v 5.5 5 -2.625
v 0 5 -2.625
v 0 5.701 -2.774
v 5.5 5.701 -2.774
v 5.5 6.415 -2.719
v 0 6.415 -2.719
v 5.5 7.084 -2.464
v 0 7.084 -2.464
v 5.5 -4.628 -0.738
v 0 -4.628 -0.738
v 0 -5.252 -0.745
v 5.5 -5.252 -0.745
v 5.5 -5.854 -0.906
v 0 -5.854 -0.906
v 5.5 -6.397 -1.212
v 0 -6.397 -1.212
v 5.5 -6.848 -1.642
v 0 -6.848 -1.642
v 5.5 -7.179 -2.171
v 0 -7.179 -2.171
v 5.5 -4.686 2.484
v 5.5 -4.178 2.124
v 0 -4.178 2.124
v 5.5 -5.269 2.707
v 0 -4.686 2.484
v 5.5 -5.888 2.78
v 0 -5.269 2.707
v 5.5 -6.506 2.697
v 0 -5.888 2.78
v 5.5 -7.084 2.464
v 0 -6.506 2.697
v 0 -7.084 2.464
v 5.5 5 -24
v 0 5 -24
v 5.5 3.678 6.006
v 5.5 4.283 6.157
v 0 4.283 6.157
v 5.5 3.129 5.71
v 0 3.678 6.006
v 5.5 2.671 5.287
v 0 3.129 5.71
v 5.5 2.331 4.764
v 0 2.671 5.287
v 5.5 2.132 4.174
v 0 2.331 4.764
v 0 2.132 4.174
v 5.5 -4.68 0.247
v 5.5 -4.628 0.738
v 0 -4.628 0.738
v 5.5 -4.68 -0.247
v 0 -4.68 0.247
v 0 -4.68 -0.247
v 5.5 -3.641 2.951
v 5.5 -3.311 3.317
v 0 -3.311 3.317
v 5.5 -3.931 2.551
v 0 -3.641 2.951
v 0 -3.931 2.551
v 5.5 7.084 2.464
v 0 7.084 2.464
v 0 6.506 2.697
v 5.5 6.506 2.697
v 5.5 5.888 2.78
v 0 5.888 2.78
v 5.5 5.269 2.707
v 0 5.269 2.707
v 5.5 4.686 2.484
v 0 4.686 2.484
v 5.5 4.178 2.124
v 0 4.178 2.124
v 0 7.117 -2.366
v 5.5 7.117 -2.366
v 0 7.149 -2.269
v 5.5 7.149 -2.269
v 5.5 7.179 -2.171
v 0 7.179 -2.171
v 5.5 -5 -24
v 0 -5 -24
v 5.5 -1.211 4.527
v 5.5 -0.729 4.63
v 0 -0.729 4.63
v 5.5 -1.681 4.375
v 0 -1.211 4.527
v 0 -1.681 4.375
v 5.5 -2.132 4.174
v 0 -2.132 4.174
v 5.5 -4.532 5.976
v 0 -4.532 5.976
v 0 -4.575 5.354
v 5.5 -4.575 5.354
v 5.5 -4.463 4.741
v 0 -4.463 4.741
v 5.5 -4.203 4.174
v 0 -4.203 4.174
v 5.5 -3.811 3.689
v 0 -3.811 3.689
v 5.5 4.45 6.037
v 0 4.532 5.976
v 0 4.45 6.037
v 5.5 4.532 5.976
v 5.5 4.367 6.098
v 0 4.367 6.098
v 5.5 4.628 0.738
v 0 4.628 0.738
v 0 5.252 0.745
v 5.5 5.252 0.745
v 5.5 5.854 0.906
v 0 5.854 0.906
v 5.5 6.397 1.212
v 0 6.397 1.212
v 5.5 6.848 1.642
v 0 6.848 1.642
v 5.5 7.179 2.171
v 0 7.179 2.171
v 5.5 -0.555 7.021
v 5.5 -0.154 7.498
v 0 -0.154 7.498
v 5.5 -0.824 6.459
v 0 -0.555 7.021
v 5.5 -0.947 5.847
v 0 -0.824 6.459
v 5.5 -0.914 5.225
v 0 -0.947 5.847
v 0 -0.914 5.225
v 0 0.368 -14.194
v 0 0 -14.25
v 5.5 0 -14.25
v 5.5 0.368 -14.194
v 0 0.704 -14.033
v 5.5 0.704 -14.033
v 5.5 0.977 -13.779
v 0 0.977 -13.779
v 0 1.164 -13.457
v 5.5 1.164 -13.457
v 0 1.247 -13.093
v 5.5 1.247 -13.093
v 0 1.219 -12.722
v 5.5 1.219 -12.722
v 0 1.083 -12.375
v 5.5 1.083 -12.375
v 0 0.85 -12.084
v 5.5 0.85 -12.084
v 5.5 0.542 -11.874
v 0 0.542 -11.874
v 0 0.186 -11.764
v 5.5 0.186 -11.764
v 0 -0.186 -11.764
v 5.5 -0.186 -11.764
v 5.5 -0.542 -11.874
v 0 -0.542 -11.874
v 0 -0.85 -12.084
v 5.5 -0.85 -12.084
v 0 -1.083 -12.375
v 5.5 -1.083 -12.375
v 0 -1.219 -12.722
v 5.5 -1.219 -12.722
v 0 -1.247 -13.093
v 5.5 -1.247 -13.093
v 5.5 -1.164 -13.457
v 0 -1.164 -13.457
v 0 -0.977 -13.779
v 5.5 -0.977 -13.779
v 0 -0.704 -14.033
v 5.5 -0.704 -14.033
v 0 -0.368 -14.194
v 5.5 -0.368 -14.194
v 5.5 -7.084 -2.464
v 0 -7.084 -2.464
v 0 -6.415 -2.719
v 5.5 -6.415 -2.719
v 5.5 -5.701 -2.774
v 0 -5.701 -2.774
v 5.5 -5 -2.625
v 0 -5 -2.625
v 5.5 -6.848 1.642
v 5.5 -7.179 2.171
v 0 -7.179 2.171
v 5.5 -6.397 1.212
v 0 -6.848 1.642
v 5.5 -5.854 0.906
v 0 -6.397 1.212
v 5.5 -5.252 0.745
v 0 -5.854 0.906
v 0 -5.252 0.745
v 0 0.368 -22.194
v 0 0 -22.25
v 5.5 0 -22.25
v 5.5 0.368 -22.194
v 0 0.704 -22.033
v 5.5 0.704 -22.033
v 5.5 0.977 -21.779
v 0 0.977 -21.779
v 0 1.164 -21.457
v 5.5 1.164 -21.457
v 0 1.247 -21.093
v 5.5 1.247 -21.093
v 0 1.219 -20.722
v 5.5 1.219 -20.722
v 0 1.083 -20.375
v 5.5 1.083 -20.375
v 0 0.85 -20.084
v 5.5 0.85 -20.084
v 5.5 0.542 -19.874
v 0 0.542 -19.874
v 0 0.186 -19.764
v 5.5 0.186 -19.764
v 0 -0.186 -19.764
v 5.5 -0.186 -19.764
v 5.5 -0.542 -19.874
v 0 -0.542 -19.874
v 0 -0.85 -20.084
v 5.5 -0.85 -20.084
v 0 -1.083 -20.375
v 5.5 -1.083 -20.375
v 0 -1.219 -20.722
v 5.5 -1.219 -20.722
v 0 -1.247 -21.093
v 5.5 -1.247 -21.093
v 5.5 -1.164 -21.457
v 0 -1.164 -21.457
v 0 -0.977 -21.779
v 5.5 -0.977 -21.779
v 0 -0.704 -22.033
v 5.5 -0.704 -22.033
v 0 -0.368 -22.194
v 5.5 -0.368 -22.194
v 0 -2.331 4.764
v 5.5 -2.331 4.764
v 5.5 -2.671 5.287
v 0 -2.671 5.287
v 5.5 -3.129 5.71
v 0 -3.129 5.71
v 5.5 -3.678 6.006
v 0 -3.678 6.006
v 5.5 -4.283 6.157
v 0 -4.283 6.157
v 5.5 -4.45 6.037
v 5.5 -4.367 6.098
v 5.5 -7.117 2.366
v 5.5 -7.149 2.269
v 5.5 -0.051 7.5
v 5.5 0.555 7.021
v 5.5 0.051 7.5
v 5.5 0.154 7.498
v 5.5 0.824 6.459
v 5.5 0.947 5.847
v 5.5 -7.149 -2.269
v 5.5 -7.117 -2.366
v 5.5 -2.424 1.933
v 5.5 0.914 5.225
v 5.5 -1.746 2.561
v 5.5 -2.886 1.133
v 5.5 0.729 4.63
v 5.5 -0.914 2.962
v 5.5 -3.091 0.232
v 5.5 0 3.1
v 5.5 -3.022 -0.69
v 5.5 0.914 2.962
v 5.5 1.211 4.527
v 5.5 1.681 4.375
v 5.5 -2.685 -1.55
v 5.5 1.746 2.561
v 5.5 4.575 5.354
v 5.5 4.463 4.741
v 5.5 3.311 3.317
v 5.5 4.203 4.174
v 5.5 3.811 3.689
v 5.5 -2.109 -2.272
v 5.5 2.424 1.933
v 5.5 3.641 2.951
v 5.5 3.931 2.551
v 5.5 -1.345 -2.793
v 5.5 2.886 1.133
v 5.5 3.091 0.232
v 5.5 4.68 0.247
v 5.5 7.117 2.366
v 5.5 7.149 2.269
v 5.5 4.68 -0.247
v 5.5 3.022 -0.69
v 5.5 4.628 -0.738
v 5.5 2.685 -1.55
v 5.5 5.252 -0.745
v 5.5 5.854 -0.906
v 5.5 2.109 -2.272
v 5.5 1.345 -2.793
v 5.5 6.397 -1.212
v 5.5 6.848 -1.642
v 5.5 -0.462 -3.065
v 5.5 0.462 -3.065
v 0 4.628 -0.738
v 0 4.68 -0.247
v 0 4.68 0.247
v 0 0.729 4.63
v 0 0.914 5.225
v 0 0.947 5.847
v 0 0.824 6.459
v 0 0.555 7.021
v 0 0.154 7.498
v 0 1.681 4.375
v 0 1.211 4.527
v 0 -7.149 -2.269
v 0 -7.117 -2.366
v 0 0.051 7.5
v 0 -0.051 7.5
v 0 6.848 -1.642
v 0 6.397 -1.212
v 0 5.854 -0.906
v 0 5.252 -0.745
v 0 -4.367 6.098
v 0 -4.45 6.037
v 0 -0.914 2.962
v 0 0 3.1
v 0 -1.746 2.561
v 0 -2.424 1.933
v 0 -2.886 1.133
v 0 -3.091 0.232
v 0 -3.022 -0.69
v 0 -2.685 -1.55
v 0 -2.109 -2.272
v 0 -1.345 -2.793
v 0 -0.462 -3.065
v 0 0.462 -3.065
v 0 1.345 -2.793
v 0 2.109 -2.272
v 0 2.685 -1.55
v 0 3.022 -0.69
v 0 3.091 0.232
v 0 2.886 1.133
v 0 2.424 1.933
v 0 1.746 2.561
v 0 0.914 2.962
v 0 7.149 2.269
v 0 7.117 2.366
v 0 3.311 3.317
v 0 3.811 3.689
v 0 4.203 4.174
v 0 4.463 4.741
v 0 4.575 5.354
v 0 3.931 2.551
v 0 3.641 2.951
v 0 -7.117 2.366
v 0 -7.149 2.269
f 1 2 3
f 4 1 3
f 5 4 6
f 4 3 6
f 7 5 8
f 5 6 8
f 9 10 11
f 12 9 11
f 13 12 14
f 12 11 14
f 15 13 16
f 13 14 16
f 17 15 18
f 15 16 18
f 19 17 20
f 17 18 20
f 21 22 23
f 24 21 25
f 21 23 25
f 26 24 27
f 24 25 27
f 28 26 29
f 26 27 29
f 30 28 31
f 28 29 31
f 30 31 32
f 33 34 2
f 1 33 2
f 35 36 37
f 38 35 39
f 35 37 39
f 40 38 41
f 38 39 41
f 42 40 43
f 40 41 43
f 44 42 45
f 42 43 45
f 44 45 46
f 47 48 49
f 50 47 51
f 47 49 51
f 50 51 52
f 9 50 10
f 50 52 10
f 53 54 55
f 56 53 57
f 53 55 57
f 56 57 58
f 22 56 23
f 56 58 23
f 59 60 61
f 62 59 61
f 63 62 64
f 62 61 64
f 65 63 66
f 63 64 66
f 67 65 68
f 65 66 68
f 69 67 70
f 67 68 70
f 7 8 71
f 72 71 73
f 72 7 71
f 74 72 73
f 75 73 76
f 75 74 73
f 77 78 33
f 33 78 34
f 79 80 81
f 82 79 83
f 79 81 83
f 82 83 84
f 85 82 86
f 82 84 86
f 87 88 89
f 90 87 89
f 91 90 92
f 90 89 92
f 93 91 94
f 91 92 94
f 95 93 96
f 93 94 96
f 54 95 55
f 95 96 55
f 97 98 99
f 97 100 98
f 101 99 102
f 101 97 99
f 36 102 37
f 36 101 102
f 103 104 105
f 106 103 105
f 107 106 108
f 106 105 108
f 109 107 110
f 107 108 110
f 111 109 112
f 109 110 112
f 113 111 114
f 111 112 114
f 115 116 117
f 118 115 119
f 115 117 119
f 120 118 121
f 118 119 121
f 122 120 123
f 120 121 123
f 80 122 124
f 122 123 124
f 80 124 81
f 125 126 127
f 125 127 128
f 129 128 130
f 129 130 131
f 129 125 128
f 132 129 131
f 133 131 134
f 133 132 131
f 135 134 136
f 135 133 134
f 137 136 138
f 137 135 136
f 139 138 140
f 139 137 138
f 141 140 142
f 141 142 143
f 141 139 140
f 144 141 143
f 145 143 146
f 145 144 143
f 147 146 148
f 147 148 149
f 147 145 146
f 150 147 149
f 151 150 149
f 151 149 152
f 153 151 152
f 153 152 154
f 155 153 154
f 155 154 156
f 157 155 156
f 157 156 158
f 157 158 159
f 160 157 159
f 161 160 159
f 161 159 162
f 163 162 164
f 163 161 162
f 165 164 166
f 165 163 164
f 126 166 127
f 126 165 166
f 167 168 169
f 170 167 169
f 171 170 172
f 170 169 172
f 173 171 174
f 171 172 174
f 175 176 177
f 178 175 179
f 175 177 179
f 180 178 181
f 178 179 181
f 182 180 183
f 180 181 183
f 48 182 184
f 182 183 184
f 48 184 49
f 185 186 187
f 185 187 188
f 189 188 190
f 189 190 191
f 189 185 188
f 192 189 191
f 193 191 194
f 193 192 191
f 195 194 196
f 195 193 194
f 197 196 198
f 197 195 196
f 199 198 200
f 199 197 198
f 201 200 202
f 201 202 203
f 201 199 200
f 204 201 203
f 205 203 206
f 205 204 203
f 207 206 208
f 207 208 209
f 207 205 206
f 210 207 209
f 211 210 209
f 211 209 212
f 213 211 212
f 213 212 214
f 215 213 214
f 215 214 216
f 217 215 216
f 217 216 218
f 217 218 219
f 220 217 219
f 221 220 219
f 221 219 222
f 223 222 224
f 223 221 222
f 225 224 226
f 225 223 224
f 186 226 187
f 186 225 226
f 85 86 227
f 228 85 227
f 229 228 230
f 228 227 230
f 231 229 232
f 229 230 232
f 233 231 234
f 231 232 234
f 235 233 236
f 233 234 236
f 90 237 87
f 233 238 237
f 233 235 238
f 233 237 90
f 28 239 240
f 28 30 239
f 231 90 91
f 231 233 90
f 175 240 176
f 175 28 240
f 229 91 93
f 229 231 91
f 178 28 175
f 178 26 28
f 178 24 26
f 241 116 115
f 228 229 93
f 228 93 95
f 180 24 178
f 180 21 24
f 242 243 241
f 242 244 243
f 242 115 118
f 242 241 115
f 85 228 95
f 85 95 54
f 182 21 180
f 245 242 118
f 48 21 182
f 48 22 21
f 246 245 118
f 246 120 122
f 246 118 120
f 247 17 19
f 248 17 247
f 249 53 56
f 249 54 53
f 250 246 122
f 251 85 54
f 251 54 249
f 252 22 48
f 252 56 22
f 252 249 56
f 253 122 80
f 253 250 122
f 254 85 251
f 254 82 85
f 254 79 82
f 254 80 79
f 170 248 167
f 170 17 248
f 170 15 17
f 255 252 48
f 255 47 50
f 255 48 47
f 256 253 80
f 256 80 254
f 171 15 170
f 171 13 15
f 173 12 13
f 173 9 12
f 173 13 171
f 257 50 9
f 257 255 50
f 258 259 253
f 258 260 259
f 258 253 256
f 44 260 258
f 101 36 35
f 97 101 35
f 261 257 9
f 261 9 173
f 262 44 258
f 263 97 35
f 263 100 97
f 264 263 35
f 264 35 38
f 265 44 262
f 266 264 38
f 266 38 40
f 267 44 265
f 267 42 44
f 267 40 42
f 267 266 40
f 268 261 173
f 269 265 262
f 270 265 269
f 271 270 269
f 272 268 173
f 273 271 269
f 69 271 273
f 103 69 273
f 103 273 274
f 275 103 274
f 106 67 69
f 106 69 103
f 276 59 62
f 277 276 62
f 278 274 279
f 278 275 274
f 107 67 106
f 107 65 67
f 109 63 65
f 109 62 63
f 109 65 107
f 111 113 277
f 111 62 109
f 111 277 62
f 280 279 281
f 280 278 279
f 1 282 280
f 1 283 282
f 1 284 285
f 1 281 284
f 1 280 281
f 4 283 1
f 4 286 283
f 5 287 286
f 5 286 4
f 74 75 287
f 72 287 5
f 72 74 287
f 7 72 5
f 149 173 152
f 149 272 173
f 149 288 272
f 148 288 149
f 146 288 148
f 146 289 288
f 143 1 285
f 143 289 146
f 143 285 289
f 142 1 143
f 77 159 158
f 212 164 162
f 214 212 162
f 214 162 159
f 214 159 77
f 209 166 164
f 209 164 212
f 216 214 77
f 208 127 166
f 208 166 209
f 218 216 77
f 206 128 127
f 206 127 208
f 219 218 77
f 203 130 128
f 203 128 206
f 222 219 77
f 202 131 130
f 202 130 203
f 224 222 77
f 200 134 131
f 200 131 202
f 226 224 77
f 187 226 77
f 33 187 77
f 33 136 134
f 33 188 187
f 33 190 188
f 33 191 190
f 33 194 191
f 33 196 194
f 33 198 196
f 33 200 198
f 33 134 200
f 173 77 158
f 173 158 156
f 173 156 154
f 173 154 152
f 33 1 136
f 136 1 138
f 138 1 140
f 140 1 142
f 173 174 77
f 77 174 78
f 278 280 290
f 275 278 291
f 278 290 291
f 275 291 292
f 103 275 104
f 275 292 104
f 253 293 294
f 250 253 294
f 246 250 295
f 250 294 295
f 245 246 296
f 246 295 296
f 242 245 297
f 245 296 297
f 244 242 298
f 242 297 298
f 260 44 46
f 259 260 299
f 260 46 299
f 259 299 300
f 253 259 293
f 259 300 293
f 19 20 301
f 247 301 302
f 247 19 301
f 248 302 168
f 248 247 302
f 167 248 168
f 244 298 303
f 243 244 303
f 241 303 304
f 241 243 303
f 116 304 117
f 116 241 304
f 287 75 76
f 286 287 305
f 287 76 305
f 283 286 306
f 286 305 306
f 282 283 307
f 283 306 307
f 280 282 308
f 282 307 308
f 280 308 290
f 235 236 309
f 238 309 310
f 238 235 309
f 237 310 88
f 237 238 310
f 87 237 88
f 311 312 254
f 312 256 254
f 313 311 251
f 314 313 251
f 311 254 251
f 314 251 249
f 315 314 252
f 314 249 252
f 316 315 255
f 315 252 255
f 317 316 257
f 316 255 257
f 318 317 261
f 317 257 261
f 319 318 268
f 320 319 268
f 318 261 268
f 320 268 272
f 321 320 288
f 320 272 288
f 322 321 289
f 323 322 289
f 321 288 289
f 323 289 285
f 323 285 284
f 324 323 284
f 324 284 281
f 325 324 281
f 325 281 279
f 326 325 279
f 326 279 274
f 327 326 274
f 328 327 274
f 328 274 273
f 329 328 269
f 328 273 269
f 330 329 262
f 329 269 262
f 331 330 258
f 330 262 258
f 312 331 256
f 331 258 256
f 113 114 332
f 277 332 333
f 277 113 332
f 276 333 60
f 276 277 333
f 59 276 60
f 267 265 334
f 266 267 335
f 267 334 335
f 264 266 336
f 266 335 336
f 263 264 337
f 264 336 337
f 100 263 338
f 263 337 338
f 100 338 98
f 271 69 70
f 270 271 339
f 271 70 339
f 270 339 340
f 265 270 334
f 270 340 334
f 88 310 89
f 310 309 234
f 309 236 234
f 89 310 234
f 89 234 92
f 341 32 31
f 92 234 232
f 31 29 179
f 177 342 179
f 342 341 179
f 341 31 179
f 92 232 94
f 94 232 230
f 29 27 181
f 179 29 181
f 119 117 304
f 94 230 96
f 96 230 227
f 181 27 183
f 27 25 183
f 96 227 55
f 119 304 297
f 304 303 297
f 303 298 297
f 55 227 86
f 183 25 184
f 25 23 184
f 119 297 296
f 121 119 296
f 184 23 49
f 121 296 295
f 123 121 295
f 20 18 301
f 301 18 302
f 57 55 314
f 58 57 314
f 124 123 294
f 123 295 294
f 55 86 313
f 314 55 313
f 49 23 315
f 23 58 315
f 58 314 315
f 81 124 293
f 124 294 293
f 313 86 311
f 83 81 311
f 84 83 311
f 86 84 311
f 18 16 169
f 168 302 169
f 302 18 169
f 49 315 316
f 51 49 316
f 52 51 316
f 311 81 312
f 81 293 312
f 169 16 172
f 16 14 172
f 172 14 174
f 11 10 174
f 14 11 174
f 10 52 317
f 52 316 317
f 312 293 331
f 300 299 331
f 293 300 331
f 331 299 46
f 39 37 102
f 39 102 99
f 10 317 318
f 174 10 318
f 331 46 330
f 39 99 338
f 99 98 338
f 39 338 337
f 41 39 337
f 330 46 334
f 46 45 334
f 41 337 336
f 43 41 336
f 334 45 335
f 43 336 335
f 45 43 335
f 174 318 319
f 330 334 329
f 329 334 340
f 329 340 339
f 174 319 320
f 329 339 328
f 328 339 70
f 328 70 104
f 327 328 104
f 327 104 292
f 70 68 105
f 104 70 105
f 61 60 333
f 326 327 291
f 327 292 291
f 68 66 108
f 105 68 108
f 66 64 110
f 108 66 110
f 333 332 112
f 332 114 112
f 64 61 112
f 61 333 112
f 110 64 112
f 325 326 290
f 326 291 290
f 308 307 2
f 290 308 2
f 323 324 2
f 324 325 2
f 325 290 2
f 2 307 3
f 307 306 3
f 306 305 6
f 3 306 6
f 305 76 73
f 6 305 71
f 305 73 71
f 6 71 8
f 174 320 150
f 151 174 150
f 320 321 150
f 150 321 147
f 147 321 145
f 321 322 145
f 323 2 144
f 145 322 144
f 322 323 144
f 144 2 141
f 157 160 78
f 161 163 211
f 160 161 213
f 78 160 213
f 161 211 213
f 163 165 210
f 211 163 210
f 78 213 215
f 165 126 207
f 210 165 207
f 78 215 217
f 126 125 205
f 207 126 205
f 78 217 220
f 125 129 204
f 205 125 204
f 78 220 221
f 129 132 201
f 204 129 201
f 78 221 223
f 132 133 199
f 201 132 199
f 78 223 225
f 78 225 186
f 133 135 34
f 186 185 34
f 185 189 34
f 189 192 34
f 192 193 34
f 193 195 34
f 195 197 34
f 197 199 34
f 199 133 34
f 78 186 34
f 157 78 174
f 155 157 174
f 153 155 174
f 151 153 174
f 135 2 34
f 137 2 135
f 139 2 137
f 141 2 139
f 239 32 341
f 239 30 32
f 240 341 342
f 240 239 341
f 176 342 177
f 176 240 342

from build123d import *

# Parameters (mm, degrees)
BASPROSKE_W     = 5.5
BASPROSKE_H     = 7.5
TOOTHCUT_DEPTH  = 12.947803145
TEETHCUTS_COUNT = 10
TEETHCUTS_ANGLE = 324
BORSKE_R        = 3.1
BORE_DEPTH      = 50.0000508
EXTRUDE_START   = -5.5
SKETCH_1_R      = 1.25
EXTRUDE_1_DEPTH = 5.5


with BuildPart() as part:
    # BasProSke → Base-Revolve (revolve)
    with BuildSketch(Plane(origin=(0, 0, 0), x_dir=(1, 0, 0), z_dir=(0, 1, 0)), mode=Mode.PRIVATE) as base_revolve_sk:
        with Locations((2.75, 3.75)):
            Rectangle(BASPROSKE_W, BASPROSKE_H)
    revolve(base_revolve_sk.sketch.rotate(Axis((-10, 0, 0), (1, 0, 0)), 180), axis=Axis((-10, 0, 0), (1, 0, 0)))

    # TooCutSke → ToothCut (cut, through all)
    with BuildSketch(Plane(origin=(0, 0, 0), x_dir=(0, 0, -1), z_dir=(1, 0, 0))):
        with BuildLine():
            ThreePointArc((0.737676151, 4.628079099), (0, 4.6865), (-0.737676151, 4.628079099))
            ThreePointArc((-0.737676151, 4.628079099), (-1.051542781, 6.151798382), (-2.205760267, 7.194877817))
            ThreePointArc((-2.205760267, 7.194877817), (0, 7.5254), (2.205760267, 7.194877817))
            ThreePointArc((2.205760267, 7.194877817), (1.051542781, 6.151798382), (0.737676151, 4.628079099))
        make_face()
    toothcut = extrude(amount=TOOTHCUT_DEPTH, mode=Mode.SUBTRACT)

    # TeethCuts: ToothCut ×10 about axis
    teethcuts_axis = Axis((-10, 0, 0), (1, 0, 0))
    for i in range(1, TEETHCUTS_COUNT):
        add(toothcut.rotate(teethcuts_axis, i * TEETHCUTS_ANGLE / (TEETHCUTS_COUNT - 1)), mode=Mode.SUBTRACT)

    # BorSke → Bore (cut, symmetric)
    with BuildSketch(Plane(origin=(0, 0, 0), x_dir=(0, 0, -1), z_dir=(1, 0, 0))):
        with Locations(Location((0, 0, 0), (0, 0, 180))):
            Circle(BORSKE_R)
    extrude(amount=BORE_DEPTH, both=True, mode=Mode.SUBTRACT)

    # ｽｹｯﾁ1 → ﾎﾞｽ - 押し出し1 (add)
    with BuildSketch(Plane(origin=(5.5, 0, 0), x_dir=(0, 0, -1), z_dir=(1, 0, 0)).offset(EXTRUDE_START)):
        with BuildLine():
            Line((2.625065975, -5), (24, -5))
            Line((24, -5), (24, 5))
            Line((24, 5), (2.625065975, 5))
            ThreePointArc((2.625065975, 5), (2.414263067, 4.564514712), (2.123524099, 4.177789805))
            ThreePointArc((2.123524099, 4.177789805), (2.754655585, 3.791458144), (3.317109183, 3.31059948))
            ThreePointArc((3.317109183, 3.31059948), (4.449153618, 4.350870864), (5.975877892, 4.53198449))
            ThreePointArc((5.975877892, 4.53198449), (6.067627458, 4.408389392), (6.156821206, 4.282937385))
            ThreePointArc((6.156821206, 4.282937385), (5.512788165, 2.886903504), (4.173610318, 2.131726803))
            ThreePointArc((4.173610318, 2.131726803), (4.457126364, 1.448208144), (4.629519252, 0.728583383))
            ThreePointArc((4.629519252, 0.728583383), (6.156818616, 0.904781587), (7.498420418, 0.153919576))
            ThreePointArc((7.498420418, 0.153919576), (7.5, 0), (7.498420418, -0.153919576))
            ThreePointArc((7.498420418, -0.153919576), (6.156818616, -0.904781587), (4.629519252, -0.728583383))
            ThreePointArc((4.629519252, -0.728583383), (4.457126364, -1.448208144), (4.173610318, -2.131726803))
            ThreePointArc((4.173610318, -2.131726803), (5.512788165, -2.886903504), (6.156821206, -4.282937385))
            ThreePointArc((6.156821206, -4.282937385), (6.067627458, -4.408389392), (5.975877892, -4.53198449))
            ThreePointArc((5.975877892, -4.53198449), (4.449153618, -4.350870864), (3.317109183, -3.31059948))
            ThreePointArc((3.317109183, -3.31059948), (2.754655585, -3.791458144), (2.123524099, -4.177789805))
            ThreePointArc((2.123524099, -4.177789805), (2.414263067, -4.564514712), (2.625065975, -5))
        make_face()
        with Locations((13, 0)):
            Circle(SKETCH_1_R, mode=Mode.SUBTRACT)
        with Locations((21, 0)):
            Circle(SKETCH_1_R, mode=Mode.SUBTRACT)
    extrude(amount=EXTRUDE_1_DEPTH)


solid = part.part
